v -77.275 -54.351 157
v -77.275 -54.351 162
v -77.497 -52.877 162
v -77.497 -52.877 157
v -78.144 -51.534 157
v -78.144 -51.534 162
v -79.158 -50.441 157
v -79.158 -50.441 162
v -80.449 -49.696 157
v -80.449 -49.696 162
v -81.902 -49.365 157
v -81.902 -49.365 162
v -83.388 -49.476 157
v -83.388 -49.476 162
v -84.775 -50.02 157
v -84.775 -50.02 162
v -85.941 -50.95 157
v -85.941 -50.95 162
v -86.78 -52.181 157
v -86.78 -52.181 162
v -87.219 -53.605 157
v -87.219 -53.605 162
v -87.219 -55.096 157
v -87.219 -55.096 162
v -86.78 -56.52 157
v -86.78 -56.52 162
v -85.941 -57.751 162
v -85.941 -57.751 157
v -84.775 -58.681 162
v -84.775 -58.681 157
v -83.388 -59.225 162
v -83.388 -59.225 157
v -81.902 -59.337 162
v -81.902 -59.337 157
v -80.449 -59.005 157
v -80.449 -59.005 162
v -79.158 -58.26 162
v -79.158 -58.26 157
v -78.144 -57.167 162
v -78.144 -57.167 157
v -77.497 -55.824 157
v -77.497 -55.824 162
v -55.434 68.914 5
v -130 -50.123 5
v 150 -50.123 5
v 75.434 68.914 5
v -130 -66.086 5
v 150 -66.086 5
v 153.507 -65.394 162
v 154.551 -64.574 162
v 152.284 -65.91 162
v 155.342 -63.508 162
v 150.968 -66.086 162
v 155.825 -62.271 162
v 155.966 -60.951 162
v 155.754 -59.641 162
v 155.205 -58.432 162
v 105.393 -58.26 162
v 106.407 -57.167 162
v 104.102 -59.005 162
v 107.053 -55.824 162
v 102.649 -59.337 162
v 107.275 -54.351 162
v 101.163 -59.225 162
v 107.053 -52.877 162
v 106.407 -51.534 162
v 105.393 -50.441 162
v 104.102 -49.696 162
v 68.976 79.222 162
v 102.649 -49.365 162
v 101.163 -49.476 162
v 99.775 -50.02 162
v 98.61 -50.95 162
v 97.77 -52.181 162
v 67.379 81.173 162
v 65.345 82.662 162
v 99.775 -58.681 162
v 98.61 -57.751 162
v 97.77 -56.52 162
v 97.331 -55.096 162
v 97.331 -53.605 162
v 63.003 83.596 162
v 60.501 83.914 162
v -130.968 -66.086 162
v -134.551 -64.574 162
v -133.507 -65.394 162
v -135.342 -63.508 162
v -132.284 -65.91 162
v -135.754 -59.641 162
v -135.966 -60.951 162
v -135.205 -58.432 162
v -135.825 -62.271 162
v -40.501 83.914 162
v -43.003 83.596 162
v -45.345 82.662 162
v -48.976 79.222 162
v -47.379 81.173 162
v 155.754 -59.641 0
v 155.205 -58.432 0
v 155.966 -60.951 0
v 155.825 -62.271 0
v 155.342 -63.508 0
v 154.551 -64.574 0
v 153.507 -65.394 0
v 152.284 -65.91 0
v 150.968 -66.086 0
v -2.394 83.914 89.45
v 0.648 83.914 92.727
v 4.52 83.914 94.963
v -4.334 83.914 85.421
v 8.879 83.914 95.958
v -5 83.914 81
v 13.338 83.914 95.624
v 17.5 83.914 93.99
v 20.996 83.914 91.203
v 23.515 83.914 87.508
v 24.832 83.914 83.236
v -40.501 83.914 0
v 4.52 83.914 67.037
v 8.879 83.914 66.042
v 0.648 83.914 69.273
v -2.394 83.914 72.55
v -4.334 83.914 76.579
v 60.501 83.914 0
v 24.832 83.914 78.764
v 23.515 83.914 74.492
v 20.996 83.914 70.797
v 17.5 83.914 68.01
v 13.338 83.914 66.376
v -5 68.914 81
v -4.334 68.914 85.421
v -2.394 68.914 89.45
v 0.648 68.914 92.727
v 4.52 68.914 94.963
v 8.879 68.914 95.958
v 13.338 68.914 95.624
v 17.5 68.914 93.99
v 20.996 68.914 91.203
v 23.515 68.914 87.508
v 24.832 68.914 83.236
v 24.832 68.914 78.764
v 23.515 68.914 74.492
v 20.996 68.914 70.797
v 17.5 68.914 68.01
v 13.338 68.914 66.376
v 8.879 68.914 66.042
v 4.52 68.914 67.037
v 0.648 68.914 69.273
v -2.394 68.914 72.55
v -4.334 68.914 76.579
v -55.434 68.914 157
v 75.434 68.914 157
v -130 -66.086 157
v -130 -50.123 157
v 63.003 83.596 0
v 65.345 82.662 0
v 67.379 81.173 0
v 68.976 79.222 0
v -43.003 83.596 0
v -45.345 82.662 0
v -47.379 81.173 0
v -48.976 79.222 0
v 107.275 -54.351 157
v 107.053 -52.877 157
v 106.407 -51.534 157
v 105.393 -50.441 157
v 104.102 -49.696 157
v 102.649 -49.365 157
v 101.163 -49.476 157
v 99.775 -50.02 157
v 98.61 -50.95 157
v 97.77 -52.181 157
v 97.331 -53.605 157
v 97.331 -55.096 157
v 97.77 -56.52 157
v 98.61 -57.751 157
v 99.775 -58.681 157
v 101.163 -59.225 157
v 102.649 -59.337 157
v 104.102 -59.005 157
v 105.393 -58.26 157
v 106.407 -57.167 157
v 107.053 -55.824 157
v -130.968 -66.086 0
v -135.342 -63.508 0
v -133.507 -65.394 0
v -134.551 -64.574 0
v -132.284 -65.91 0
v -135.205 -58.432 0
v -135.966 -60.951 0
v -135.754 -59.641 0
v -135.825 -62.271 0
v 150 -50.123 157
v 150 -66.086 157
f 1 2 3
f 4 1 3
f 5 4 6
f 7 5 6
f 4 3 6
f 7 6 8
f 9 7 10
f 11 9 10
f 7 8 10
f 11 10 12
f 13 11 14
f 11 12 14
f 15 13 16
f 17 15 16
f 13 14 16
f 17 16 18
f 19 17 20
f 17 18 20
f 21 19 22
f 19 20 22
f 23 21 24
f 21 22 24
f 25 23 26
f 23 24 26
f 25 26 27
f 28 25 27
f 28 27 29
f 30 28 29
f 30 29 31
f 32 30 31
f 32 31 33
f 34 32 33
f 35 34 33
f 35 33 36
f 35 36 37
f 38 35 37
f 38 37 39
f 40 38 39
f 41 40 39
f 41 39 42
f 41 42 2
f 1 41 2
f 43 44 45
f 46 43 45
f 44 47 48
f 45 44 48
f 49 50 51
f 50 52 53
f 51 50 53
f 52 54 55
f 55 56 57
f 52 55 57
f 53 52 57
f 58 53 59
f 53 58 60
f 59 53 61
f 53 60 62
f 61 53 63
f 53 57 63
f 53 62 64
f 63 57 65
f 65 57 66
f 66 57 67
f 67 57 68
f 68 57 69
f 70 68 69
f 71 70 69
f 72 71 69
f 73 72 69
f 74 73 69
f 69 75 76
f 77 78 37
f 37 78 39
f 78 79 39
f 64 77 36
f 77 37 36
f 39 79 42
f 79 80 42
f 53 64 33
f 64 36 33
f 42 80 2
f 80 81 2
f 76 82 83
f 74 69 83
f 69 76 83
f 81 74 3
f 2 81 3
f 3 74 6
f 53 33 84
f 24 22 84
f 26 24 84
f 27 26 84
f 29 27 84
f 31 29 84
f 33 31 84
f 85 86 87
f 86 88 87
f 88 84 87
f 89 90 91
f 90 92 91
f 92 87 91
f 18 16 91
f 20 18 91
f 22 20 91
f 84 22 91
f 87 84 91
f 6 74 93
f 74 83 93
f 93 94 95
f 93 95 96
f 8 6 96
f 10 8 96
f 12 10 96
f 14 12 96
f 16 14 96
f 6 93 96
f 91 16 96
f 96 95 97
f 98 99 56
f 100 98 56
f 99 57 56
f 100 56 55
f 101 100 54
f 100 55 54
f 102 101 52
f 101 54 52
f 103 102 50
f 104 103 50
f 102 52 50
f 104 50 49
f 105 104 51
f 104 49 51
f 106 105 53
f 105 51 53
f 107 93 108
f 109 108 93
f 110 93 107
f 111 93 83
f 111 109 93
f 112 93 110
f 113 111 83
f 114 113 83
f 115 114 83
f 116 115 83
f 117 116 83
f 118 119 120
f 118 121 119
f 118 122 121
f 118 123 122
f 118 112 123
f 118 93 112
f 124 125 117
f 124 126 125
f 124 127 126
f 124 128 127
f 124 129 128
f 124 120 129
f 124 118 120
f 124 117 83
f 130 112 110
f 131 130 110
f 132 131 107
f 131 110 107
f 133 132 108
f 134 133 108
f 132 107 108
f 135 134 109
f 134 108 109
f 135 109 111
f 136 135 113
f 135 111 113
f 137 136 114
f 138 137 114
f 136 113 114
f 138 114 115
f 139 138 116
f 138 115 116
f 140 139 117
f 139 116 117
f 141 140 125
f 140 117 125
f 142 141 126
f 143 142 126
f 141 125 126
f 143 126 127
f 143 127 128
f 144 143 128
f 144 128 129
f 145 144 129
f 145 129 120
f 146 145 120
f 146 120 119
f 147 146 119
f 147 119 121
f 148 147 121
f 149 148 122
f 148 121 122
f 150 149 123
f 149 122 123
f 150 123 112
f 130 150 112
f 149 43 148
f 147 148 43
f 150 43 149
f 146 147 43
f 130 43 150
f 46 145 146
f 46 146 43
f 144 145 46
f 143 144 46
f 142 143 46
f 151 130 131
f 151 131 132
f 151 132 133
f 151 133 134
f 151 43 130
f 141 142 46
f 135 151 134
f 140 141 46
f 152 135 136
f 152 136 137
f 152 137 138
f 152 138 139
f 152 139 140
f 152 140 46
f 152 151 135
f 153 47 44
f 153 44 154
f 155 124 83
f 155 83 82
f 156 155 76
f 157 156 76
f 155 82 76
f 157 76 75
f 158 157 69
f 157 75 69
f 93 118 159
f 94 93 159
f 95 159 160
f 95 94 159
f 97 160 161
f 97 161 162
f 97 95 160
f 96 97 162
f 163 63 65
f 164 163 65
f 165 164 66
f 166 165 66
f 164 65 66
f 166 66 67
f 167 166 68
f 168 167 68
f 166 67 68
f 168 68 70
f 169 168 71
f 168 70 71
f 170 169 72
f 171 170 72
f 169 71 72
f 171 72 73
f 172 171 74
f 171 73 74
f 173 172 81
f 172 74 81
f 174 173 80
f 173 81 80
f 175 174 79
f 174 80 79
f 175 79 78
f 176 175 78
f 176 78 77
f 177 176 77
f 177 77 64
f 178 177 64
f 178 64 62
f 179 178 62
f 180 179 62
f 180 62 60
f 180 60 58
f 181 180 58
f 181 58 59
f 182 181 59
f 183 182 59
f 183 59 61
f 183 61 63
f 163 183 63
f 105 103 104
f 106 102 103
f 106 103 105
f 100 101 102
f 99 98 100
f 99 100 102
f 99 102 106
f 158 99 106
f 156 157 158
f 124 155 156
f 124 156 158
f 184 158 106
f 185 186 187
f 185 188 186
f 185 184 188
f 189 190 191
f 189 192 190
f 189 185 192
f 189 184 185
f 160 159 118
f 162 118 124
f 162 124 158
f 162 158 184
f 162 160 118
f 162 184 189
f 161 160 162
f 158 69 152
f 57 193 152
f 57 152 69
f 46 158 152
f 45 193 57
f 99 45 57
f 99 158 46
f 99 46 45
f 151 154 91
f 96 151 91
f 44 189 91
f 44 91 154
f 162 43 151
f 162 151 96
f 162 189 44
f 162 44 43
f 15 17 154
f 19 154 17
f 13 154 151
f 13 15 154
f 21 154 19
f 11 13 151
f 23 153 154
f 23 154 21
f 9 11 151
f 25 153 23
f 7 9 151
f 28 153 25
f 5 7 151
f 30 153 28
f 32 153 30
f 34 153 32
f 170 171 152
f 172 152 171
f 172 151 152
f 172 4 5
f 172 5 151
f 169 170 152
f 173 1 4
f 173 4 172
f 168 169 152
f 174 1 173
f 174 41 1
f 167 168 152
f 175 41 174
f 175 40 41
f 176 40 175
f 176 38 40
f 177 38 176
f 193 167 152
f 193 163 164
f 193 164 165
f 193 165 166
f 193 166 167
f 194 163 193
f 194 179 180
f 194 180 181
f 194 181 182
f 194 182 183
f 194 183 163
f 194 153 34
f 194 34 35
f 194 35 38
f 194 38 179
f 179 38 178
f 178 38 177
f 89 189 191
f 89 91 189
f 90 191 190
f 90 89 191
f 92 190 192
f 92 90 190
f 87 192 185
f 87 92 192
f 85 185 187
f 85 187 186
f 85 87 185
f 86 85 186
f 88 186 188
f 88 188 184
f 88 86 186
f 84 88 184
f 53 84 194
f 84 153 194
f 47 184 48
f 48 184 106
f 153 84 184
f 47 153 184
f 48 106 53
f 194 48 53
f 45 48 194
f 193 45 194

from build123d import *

# Parameters (mm, degrees)
BOSS_EXTRUDE1_DEPTH = 162
SKETCH2_R           = 15
CUT_EXTRUDE1_DEPTH  = 15
SKETCH4_W           = 280
SKETCH4_H           = 152
CUT_EXTRUDE3_DEPTH  = 135
FILLET2_R           = 10
FILLET3_R           = 5
SKETCH5_R           = 5
CUT_EXTRUDE4_DEPTH  = 135


with BuildPart() as part:
    # Sketch1 → Boss-Extrude1 (new body)
    with BuildSketch(Plane.XY):
        Polygon((-46.03724142, 83.913559712), (66.03724142, 83.913559712), (160, -66.086440288), (10, -66.086440288), (-140, -66.086440288), align=None)
    extrude(amount=BOSS_EXTRUDE1_DEPTH)

    # Sketch2 → Cut-Extrude1 (cut)
    with BuildSketch(Plane(origin=(0, 83.913559712, 0), x_dir=(1, 0, 0), z_dir=(0, 1, 0))):
        with Locations(Location((10, -81, 0), (0, 0, 180))):
            Circle(SKETCH2_R)
    extrude(amount=-CUT_EXTRUDE1_DEPTH, mode=Mode.SUBTRACT)

    # Sketch4 → Cut-Extrude3 (cut)
    with BuildSketch(Plane.XZ.offset(66.086440288)):
        with Locations((10, 81)):
            Rectangle(SKETCH4_W, SKETCH4_H)
    extrude(amount=-CUT_EXTRUDE3_DEPTH, mode=Mode.SUBTRACT)

    # Fillet2
    fillet2_edges = [part.edges().sort_by_distance(p)[0] for p in [
        (-46.03724142, 83.913559712, 81),
        (66.03724142, 83.913559712, 81),
    ]]
    fillet(fillet2_edges, radius=FILLET2_R)

    # Fillet3
    fillet3_edges = [part.edges().sort_by_distance(p)[0] for p in [
        (160, -66.086440288, 81),
        (-140, -66.086440288, 81),
    ]]
    fillet(fillet3_edges, radius=FILLET3_R)

    # Sketch5 → Cut-Extrude4 (cut)
    with BuildSketch(Plane.XY.offset(162)):
        with Locations((102.275314, -54.350620288)):
            Circle(SKETCH5_R)
        with Locations((-82.275314, -54.350620288)):
            Circle(SKETCH5_R)
    extrude(amount=-CUT_EXTRUDE4_DEPTH, mode=Mode.SUBTRACT)


solid = part.part
